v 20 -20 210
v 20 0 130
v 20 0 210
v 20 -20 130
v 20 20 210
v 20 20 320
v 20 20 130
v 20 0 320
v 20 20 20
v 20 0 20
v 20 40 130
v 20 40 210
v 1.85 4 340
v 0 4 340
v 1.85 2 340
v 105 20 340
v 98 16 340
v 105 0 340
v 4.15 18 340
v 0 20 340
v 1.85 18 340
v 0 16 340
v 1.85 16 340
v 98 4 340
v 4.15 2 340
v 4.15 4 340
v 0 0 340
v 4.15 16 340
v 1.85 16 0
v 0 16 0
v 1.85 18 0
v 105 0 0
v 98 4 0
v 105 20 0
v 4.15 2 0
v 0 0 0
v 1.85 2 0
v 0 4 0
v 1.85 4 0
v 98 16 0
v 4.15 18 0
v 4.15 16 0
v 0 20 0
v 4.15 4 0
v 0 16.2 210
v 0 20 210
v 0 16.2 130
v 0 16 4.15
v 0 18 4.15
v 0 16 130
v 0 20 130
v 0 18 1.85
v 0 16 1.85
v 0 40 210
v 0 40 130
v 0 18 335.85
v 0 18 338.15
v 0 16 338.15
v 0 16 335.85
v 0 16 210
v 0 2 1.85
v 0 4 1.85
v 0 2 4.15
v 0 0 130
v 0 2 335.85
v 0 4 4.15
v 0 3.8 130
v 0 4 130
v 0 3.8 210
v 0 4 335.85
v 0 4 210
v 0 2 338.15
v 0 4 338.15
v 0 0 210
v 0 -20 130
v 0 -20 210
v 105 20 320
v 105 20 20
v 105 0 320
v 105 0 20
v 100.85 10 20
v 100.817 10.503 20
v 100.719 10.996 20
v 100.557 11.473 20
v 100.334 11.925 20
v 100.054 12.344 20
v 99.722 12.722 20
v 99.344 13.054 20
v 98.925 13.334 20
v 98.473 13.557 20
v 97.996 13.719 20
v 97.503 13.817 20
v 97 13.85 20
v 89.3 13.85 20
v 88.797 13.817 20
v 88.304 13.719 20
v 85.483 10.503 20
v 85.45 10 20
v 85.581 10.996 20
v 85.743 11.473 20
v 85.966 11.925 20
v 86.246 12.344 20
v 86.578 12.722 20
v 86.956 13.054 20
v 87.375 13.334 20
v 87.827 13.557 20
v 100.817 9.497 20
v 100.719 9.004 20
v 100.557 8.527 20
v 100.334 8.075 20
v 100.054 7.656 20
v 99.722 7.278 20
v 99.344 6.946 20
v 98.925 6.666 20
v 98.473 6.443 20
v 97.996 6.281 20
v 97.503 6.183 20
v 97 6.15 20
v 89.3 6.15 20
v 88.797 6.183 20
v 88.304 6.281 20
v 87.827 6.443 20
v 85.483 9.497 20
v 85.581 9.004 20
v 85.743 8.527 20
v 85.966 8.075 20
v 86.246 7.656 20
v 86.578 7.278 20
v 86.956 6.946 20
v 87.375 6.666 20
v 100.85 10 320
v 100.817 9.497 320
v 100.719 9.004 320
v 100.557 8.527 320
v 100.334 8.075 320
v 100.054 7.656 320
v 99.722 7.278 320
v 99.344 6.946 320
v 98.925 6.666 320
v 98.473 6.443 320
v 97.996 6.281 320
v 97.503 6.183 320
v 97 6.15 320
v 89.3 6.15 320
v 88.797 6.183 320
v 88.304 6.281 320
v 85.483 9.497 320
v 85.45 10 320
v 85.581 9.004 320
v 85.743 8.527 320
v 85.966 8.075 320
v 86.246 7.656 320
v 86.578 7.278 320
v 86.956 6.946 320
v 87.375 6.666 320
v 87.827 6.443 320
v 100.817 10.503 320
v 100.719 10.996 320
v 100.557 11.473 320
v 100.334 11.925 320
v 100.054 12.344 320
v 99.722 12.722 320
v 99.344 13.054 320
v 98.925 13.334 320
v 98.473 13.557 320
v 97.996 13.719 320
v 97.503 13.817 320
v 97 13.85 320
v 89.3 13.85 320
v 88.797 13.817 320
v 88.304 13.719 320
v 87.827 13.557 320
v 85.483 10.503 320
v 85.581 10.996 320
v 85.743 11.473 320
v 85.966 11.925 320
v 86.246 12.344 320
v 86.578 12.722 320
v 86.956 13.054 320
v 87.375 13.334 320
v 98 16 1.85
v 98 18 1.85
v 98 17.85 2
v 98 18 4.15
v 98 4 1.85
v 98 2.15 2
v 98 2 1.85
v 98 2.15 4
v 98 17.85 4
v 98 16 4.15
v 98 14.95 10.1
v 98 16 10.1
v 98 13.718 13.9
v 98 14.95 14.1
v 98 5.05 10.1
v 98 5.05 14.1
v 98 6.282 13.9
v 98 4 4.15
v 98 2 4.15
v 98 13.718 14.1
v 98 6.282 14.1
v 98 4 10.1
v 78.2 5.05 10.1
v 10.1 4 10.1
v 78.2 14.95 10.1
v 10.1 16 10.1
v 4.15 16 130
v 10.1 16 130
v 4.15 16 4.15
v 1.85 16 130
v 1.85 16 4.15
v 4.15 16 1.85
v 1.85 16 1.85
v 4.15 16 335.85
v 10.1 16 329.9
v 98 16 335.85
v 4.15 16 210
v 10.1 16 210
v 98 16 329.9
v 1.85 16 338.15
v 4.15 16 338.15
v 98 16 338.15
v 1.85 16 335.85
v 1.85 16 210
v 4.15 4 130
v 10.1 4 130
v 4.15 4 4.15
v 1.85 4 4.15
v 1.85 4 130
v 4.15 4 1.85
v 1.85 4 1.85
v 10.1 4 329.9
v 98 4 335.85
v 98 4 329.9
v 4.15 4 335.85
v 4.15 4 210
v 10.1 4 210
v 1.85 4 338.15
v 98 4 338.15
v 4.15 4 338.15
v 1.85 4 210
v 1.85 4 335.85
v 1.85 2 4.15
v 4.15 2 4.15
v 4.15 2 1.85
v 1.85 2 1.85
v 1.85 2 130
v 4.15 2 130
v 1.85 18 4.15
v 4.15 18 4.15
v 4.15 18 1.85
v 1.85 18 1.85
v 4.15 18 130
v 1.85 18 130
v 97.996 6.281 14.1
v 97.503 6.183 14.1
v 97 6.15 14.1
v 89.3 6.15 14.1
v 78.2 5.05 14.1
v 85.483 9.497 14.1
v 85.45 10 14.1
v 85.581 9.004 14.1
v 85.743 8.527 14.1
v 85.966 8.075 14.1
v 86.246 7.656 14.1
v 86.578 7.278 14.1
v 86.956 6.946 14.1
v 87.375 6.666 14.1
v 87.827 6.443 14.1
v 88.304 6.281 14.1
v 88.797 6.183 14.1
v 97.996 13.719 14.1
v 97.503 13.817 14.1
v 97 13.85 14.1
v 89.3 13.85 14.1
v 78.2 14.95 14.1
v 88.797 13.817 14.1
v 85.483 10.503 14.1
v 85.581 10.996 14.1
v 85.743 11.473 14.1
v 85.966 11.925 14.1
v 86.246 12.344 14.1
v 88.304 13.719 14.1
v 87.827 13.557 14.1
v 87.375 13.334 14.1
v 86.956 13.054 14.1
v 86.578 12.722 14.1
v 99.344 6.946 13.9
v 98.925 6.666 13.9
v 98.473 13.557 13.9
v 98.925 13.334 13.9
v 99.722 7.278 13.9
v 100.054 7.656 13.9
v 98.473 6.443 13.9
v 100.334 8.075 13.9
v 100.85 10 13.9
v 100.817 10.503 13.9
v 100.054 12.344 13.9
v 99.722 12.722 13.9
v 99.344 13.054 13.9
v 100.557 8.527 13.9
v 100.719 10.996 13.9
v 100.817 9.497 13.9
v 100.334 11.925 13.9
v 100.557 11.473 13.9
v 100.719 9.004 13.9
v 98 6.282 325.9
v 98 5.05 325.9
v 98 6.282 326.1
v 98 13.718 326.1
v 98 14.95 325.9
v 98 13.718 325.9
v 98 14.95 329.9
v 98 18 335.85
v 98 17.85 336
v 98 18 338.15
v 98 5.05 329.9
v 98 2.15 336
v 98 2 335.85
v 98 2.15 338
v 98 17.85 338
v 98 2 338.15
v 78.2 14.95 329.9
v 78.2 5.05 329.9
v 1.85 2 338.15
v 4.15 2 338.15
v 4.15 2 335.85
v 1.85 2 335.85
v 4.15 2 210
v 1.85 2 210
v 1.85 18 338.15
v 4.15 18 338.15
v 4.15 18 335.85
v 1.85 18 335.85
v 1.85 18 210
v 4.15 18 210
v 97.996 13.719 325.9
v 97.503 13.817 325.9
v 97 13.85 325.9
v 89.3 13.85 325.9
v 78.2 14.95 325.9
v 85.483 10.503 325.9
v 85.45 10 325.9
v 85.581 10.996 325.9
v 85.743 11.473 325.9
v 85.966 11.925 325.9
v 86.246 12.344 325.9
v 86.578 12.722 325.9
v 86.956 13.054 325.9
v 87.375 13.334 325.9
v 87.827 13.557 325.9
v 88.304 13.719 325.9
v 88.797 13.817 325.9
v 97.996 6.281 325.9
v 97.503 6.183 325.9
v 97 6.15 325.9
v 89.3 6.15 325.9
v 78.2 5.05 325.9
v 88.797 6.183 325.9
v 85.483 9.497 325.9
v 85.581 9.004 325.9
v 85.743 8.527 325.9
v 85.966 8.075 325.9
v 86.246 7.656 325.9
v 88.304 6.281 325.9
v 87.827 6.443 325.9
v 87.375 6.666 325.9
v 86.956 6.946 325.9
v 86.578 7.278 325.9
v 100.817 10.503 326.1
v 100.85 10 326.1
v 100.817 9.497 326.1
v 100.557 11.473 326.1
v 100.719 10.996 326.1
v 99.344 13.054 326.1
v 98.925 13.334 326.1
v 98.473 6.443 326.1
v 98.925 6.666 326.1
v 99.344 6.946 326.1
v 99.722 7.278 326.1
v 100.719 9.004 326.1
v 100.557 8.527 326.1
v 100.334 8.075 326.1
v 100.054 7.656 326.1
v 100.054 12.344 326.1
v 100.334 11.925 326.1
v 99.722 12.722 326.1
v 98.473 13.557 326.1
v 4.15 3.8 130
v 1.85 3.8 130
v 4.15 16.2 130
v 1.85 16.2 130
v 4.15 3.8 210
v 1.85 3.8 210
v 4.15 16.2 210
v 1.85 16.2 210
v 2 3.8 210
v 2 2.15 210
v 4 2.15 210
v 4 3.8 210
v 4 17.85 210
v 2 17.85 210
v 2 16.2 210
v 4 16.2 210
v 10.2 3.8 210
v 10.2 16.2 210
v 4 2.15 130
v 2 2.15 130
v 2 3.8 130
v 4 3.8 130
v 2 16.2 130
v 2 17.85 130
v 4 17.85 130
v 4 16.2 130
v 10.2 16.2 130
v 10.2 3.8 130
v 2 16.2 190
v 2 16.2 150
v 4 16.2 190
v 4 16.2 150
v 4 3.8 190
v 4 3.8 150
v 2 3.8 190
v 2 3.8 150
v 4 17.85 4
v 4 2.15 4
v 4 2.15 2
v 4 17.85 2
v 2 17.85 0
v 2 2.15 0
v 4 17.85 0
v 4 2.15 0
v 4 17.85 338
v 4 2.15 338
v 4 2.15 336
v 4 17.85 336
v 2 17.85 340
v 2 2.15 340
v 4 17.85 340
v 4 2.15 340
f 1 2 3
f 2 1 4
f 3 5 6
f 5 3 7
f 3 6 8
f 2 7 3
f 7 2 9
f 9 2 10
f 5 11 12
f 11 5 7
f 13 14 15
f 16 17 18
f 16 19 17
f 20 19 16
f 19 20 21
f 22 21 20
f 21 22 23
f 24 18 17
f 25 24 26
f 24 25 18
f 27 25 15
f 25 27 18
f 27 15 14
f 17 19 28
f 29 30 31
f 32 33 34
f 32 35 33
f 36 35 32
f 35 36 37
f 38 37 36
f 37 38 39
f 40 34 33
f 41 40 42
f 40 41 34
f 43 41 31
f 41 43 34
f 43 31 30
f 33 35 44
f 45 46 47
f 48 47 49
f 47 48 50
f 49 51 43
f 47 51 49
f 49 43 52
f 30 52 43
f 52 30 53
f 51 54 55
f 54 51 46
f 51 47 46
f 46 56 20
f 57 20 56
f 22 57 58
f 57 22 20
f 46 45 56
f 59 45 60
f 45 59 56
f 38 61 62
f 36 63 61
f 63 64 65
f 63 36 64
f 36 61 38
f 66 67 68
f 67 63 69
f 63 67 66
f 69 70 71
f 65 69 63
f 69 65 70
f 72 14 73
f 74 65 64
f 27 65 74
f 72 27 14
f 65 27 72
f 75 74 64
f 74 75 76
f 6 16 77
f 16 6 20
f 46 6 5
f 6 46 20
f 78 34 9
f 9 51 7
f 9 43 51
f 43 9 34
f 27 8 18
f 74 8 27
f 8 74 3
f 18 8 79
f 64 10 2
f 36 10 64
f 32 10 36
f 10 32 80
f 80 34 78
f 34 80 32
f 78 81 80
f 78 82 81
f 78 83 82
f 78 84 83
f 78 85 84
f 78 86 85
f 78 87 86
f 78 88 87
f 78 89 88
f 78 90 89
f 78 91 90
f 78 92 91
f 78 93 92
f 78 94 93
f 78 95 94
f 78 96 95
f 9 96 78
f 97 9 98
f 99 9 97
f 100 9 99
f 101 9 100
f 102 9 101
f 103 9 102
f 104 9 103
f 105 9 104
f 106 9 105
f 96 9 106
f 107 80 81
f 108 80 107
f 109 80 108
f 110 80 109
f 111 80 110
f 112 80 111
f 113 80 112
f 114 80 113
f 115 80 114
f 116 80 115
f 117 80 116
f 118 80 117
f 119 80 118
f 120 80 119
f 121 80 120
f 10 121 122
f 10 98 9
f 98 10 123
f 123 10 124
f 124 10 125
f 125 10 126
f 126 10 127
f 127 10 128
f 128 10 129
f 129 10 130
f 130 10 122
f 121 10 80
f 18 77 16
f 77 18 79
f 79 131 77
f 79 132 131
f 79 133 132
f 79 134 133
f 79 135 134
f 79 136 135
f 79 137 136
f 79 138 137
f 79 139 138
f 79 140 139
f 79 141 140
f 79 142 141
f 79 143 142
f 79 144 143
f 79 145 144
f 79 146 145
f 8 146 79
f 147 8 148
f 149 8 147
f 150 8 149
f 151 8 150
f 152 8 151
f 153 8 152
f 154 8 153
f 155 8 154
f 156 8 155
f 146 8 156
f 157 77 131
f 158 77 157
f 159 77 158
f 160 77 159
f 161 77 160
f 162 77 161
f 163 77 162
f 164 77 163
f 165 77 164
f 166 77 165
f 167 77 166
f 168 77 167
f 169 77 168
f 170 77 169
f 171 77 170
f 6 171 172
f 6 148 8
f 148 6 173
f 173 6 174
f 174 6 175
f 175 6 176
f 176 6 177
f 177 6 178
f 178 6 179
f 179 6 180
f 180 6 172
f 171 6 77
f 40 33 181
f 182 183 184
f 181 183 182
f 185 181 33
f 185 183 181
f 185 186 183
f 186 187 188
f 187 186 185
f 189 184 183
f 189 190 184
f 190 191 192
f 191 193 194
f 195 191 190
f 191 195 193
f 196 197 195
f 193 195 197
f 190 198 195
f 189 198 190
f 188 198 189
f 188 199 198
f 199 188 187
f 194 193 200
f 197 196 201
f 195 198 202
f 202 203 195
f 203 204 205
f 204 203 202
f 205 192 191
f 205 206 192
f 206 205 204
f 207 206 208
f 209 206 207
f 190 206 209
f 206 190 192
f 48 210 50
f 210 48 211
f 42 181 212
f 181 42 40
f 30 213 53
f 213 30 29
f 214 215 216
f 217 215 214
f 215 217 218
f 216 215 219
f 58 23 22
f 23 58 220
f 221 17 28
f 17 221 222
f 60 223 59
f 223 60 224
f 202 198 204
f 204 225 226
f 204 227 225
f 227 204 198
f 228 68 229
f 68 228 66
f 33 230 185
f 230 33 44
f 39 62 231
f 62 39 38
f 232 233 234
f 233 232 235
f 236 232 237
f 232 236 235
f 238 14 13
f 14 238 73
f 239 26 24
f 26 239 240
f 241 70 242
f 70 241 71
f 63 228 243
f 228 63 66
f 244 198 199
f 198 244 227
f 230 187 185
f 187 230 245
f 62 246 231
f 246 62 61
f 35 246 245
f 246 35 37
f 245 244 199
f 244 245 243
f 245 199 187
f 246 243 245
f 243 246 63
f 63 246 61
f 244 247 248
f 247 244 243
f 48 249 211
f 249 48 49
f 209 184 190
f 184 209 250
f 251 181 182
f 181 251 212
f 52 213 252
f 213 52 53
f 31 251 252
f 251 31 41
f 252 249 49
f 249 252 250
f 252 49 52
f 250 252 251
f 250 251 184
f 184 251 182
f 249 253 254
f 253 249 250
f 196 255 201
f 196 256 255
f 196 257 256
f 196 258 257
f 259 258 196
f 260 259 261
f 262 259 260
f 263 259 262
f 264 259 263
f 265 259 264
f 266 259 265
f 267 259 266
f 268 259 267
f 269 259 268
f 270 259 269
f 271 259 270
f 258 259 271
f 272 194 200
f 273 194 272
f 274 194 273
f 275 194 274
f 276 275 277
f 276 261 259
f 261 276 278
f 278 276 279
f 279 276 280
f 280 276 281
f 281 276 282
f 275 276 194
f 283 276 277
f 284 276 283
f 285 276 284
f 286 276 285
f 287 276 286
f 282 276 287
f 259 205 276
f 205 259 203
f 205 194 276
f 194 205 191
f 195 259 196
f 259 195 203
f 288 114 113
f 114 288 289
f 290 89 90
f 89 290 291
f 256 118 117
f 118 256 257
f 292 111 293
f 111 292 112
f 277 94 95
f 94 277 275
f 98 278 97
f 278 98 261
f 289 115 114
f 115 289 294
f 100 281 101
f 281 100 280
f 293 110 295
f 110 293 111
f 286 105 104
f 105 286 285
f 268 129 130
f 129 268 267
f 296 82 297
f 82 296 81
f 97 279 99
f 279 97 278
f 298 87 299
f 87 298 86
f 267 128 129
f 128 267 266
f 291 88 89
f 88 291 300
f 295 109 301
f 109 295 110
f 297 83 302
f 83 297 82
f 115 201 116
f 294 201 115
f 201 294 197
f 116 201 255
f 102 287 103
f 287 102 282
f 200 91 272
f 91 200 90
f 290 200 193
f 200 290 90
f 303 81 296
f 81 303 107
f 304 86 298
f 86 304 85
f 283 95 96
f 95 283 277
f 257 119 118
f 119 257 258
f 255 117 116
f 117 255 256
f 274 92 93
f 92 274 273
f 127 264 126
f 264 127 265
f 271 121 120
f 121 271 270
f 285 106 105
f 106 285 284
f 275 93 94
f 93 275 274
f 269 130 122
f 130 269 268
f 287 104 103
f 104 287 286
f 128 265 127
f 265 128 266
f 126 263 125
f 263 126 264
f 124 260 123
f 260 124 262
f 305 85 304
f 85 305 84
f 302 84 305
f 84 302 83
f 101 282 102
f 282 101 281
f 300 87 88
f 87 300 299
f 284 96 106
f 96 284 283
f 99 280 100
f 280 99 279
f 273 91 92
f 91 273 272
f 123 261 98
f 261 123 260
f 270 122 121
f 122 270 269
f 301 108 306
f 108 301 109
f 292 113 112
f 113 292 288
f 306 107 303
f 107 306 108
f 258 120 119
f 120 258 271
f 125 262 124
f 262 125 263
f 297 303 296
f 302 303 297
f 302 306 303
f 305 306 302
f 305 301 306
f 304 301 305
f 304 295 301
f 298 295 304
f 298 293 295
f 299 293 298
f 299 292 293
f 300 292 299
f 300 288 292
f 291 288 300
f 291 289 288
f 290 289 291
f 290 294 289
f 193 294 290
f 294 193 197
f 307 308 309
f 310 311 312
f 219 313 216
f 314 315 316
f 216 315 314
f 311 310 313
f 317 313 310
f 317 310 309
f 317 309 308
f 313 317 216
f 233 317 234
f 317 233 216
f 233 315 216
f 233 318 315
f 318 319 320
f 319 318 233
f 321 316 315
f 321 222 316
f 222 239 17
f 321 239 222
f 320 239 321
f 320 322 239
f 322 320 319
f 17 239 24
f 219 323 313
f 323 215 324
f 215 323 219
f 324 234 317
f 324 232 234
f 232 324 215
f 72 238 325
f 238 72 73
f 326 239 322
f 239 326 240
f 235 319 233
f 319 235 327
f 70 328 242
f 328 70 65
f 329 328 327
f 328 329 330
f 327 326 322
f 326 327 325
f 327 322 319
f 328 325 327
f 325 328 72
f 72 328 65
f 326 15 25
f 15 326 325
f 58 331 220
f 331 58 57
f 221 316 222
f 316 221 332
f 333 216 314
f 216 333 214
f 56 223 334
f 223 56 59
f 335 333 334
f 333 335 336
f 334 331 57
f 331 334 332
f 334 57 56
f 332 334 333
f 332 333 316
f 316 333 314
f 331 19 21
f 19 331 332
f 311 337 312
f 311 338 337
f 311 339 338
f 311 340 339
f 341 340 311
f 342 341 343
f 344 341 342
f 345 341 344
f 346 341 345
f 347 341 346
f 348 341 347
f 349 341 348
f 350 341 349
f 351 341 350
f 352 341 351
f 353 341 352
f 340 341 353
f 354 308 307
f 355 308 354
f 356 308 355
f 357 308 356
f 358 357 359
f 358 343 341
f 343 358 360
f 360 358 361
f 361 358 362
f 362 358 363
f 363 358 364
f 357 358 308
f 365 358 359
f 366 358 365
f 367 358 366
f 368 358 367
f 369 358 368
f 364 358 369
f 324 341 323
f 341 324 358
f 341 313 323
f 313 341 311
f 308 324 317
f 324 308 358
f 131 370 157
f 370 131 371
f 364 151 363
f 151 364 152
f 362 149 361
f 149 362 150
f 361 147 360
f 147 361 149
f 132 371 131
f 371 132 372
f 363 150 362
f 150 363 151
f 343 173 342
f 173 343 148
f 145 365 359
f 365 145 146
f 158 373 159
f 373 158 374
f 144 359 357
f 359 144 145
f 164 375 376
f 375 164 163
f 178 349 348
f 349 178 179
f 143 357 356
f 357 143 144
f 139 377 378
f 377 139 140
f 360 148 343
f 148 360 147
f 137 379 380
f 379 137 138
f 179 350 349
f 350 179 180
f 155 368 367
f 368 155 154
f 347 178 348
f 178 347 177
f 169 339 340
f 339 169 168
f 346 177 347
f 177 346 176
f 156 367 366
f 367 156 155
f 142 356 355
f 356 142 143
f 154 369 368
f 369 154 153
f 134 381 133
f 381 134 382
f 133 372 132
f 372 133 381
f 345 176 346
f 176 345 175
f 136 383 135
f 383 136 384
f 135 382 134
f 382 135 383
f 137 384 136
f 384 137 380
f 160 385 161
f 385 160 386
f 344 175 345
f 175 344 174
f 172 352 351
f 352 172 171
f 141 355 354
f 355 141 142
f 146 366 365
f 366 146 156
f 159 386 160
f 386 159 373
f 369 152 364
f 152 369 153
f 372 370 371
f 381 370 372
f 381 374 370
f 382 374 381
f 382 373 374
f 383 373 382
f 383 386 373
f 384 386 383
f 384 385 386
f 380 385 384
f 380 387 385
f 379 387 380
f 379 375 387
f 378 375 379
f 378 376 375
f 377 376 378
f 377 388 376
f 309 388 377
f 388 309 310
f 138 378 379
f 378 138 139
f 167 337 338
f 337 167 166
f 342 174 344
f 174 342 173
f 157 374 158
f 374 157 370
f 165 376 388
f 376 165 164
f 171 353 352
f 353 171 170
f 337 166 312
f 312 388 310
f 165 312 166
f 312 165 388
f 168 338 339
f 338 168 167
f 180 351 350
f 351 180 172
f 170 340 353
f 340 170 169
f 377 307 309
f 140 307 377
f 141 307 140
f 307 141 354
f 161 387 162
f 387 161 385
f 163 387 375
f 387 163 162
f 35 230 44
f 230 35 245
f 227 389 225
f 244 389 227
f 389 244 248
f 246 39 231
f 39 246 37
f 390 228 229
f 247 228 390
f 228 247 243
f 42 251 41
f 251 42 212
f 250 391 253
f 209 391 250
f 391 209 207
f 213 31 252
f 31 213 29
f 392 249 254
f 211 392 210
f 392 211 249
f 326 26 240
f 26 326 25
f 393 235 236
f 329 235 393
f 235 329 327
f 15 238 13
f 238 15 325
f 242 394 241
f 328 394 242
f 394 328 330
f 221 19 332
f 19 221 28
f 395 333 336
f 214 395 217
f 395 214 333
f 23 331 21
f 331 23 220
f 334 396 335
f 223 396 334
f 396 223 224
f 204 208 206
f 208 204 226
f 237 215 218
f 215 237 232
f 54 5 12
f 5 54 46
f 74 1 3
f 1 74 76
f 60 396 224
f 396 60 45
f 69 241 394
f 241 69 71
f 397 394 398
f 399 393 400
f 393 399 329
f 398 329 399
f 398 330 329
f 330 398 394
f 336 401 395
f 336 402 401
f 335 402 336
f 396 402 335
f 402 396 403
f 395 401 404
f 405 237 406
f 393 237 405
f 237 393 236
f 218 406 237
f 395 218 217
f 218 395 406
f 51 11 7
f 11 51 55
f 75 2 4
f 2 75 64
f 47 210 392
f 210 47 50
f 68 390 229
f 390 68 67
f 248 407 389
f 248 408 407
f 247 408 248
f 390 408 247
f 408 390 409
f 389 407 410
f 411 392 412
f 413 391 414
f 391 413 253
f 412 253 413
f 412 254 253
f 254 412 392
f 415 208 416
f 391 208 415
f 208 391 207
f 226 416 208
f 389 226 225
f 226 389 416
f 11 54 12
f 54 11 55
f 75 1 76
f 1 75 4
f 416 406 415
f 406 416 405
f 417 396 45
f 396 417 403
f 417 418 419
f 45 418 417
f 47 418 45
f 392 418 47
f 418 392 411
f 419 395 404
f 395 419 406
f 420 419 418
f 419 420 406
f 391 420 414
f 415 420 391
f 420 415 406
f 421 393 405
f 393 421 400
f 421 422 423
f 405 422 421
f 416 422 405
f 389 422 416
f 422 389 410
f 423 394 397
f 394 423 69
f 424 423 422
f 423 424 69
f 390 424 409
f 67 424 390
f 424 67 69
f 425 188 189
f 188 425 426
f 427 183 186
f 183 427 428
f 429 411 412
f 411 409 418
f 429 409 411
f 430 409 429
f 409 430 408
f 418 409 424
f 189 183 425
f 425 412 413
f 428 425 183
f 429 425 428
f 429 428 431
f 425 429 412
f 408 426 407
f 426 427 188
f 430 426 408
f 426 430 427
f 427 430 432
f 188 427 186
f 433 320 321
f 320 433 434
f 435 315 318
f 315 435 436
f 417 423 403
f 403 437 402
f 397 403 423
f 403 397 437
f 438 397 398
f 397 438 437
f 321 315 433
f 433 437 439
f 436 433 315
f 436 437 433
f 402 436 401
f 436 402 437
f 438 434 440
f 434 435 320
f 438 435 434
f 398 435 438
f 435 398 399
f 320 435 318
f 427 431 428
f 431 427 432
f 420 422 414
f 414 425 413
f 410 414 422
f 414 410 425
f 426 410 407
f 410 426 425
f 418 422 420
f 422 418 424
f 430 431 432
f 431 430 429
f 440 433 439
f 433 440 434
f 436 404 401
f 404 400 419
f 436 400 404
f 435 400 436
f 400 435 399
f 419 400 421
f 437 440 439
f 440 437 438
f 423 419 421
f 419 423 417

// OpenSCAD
/* Pinewood Derby U-frame with a continuous concealed cable channel — no electronics housing.
   +X = U opening / track side, X=0 = rear face of the tall rail. The separate
   housing is glued over the 40 mm cable entry at the center of the rear face.
*/
$fn=48;
variant="start_left"; // start_left | start_right | finish_left | finish_right
piece="preview";      // preview | frame | arm_covers | vertical_covers | lower_arm_cover | upper_arm_cover | lower_vertical_cover | upper_vertical_cover | print_layout | start_bottom | start_middle | start_top

profile=20; arm=105; channel_depth=10; sensor_extra=4;
channel_end=98;       // 7 mm solid arm tip
sensor_l=19.8; sensor_w=9.9; sensor_h=7.9; optic_d=7.7;
optic_slot_len=2*optic_d;  // internal opening: 15.4 x 7.7 mm
sensor_x0=78.2; optic_x=97; optic_y=10;
// Arm covers meet the rear vertical channel with a 2 mm gap.
arm_cover_start=2; arm_cover_len=channel_end-arm_cover_start;
mid_gap=40;
mount_width=60;      // Glue area across the cable channel
mount_height=80;     // 20 mm margin above/below the 40 mm cable entry
joint_z=80;          // Height of the two start-frame corner modules
joint_depth=20;      // Length of the keyed joining tongues
function H()=(variant=="start_left" || variant=="start_right") ? 340 : 240;
function mirrored()=(variant=="start_right" || variant=="finish_right");

module raw_u(h) {
  union() {
    cube([profile,profile,h]);
    cube([arm,profile,profile]);
    translate([0,0,h-profile]) cube([arm,profile,profile]);
  }
}

// C-channel on the outer face of either transverse arm.
module arm_channel_cuts(z,upper=true) {
  if(upper) {
    // Central 12 mm trough, 10 mm deep; a closed C-groove on each side.
    translate([0,4,z+profile-channel_depth-.1]) cube([channel_end,12,channel_depth+.2]);
    translate([0,2,z+profile-4.15]) cube([channel_end,2,2.3]);
    translate([0,16,z+profile-4.15]) cube([channel_end,2,2.3]);
    // Additional 4 mm-deep sensor pocket.
    translate([sensor_x0,(profile-sensor_w)/2,z+profile-channel_depth-sensor_extra-.1])
      cube([sensor_l,sensor_w,channel_depth+sensor_extra+.2]);
    // Internal opening as a slot. Its front edge remains at the original circle
    // position; the extension only goes towards the cable / rail side.
    hull() {
      translate([optic_x,optic_y,z-.1]) cylinder(d=optic_d,h=profile-channel_depth-sensor_extra+.2);
      translate([optic_x-(optic_slot_len-optic_d),optic_y,z-.1])
        cylinder(d=optic_d,h=profile-channel_depth-sensor_extra+.2);
    }
  } else {
    translate([0,4,z-.1]) cube([channel_end,12,channel_depth+.2]);
    translate([0,2,z+1.85]) cube([channel_end,2,2.3]);
    translate([0,16,z+1.85]) cube([channel_end,2,2.3]);
    translate([sensor_x0,(profile-sensor_w)/2,z-.1])
      cube([sensor_l,sensor_w,channel_depth+sensor_extra+.2]);
    hull() {
      translate([optic_x,optic_y,z+channel_depth+sensor_extra-.1])
        cylinder(d=optic_d,h=profile-channel_depth-sensor_extra+.2);
      translate([optic_x-(optic_slot_len-optic_d),optic_y,z+channel_depth+sensor_extra-.1])
        cylinder(d=optic_d,h=profile-channel_depth-sensor_extra+.2);
    }
  }
}

// C-channel on the rear face of the tall rail (X=0), opposite the U opening.
// The side faces and the inner U face remain fully closed.
module vertical_channel_cut(h) {
  // Deep 12 mm trough, 10 mm into the rail from X=0.
  translate([-.1,4,0]) cube([channel_depth+.2,12,h]);
  // C-guides end at the 40 mm cable entry. There is only an open trough there,
  // no cover rail, so the covers stop automatically.
  guide_len=h/2-mid_gap/2;
  for (guide_z=[0,h/2+mid_gap/2]) {
    translate([1.85,2,guide_z]) cube([2.3,2,guide_len]);
    translate([1.85,16,guide_z]) cube([2.3,2,guide_len]);
  }
}

// Laterally widened rail: 60 mm across, around the cable channel, and through
// the entire 20 mm profile depth. This keeps the rear face flat for gluing.
module mounting_plate(h) {
  translate([0,-(mount_width-profile)/2,h/2-mount_height/2])
    cube([profile,mount_width,mount_height]);
}

// This cut is applied only after uniting the U-frame and mounting plate. It
// continues the rear 10 mm cable trough across the complete 80 mm mounting
// height. The remaining 10 mm towards the inner U face intentionally stays closed.
module housing_cable_transition(h) {
  translate([-.2,3.8,h/2-mount_height/2])
    cube([channel_depth+.4,12.4,mount_height]);
}

module frame(h) {
  difference() {
    union() {
      difference() {
        raw_u(h);
        arm_channel_cuts(0,false);
        arm_channel_cuts(h-profile,true);
        vertical_channel_cut(h);
      }
      mounting_plate(h);
    }
    housing_cable_transition(h);
  }
}

// The asymmetric tongue is on the solid inner side of the rail. It cannot
// collide with the rear cable channel and enforces the correct orientation.
module joint_tongue(z0) {
  translate([10,3,z0]) cube([10,14,joint_depth]);
}
module joint_socket(z0) {
  translate([9.7,2.7,z0]) cube([10.6,14.6,joint_depth+.2]);
}

// Start frame for 250 mm printers: 80 mm corner modules and a 180 mm middle rail.
module start_bottom() {
  union() {
    intersection() { frame(340); translate([-5,-21,-1]) cube([111,62,joint_z+1]); }
    joint_tongue(joint_z);
  }
}
module start_top() {
  union() {
    intersection() { frame(340); translate([-5,-21,340-joint_z]) cube([111,62,joint_z+1]); }
    joint_tongue(340-joint_z-joint_depth);
  }
}
module start_middle() {
  difference() {
    intersection() { frame(340); translate([-5,-21,joint_z]) cube([111,62,340-2*joint_z]); }
    joint_socket(joint_z);
    joint_socket(340-joint_z-joint_depth);
  }
}

// Arm cover: 2 mm thick, 2 mm below the outer face, guided in the C-grooves.
module arm_cover(z,upper=true,xpos=arm_cover_start) {
  if(upper)
    translate([xpos,2.15,z+profile-4]) cube([arm_cover_len,15.7,2]);
  else
    translate([xpos,2.15,z+2]) cube([arm_cover_len,15.7,2]);
}

// Rear cover for the tall rail. The 40 mm center is intentionally left open.
module vertical_cover(z0,len) {
  translate([2,2.15,z0]) cube([2,15.7,len]);
}

module all_covers(h) {
  arm_cover(0,false);
  arm_cover(h-profile,true);
  lower_len=h/2-mid_gap/2;
  upper_z=h/2+mid_gap/2;
  vertical_cover(0,lower_len);
  vertical_cover(upper_z,h-upper_z);
}

// All four covers arranged separately and flat — directly printable without supports.
module cover_print_layout(h) {
  low_len=h/2-mid_gap/2;
  translate([0,0,0]) cube([arm_cover_len,15.7,2]);
  translate([0,20,0]) cube([arm_cover_len,15.7,2]);
  translate([0,40,0]) cube([low_len,15.7,2]);
  translate([0,60,0]) cube([low_len,15.7,2]);
}

module selected() {
  if(mirrored()) mirror([1,0,0]) children(); else children();
}

if(piece=="frame") selected() frame(H());
if(piece=="arm_covers") selected() { arm_cover(0,false); arm_cover(H()-profile,true); }
if(piece=="vertical_covers") selected() {
  vertical_cover(0,H()/2-mid_gap/2);
  vertical_cover(H()/2+mid_gap/2,H()/2-mid_gap/2);
}
if(piece=="lower_arm_cover") arm_cover(0,false);
if(piece=="upper_arm_cover") arm_cover(H()-profile,true);
if(piece=="lower_vertical_cover") vertical_cover(0,H()/2-mid_gap/2);
if(piece=="upper_vertical_cover") vertical_cover(H()/2+mid_gap/2,H()/2-mid_gap/2);
if(piece=="print_layout") cover_print_layout(H());
if(piece=="start_bottom") selected() start_bottom();
if(piece=="start_middle") selected() start_middle();
if(piece=="start_top") selected() start_top();
if(piece=="preview") selected() { frame(H()); all_covers(H()); }
